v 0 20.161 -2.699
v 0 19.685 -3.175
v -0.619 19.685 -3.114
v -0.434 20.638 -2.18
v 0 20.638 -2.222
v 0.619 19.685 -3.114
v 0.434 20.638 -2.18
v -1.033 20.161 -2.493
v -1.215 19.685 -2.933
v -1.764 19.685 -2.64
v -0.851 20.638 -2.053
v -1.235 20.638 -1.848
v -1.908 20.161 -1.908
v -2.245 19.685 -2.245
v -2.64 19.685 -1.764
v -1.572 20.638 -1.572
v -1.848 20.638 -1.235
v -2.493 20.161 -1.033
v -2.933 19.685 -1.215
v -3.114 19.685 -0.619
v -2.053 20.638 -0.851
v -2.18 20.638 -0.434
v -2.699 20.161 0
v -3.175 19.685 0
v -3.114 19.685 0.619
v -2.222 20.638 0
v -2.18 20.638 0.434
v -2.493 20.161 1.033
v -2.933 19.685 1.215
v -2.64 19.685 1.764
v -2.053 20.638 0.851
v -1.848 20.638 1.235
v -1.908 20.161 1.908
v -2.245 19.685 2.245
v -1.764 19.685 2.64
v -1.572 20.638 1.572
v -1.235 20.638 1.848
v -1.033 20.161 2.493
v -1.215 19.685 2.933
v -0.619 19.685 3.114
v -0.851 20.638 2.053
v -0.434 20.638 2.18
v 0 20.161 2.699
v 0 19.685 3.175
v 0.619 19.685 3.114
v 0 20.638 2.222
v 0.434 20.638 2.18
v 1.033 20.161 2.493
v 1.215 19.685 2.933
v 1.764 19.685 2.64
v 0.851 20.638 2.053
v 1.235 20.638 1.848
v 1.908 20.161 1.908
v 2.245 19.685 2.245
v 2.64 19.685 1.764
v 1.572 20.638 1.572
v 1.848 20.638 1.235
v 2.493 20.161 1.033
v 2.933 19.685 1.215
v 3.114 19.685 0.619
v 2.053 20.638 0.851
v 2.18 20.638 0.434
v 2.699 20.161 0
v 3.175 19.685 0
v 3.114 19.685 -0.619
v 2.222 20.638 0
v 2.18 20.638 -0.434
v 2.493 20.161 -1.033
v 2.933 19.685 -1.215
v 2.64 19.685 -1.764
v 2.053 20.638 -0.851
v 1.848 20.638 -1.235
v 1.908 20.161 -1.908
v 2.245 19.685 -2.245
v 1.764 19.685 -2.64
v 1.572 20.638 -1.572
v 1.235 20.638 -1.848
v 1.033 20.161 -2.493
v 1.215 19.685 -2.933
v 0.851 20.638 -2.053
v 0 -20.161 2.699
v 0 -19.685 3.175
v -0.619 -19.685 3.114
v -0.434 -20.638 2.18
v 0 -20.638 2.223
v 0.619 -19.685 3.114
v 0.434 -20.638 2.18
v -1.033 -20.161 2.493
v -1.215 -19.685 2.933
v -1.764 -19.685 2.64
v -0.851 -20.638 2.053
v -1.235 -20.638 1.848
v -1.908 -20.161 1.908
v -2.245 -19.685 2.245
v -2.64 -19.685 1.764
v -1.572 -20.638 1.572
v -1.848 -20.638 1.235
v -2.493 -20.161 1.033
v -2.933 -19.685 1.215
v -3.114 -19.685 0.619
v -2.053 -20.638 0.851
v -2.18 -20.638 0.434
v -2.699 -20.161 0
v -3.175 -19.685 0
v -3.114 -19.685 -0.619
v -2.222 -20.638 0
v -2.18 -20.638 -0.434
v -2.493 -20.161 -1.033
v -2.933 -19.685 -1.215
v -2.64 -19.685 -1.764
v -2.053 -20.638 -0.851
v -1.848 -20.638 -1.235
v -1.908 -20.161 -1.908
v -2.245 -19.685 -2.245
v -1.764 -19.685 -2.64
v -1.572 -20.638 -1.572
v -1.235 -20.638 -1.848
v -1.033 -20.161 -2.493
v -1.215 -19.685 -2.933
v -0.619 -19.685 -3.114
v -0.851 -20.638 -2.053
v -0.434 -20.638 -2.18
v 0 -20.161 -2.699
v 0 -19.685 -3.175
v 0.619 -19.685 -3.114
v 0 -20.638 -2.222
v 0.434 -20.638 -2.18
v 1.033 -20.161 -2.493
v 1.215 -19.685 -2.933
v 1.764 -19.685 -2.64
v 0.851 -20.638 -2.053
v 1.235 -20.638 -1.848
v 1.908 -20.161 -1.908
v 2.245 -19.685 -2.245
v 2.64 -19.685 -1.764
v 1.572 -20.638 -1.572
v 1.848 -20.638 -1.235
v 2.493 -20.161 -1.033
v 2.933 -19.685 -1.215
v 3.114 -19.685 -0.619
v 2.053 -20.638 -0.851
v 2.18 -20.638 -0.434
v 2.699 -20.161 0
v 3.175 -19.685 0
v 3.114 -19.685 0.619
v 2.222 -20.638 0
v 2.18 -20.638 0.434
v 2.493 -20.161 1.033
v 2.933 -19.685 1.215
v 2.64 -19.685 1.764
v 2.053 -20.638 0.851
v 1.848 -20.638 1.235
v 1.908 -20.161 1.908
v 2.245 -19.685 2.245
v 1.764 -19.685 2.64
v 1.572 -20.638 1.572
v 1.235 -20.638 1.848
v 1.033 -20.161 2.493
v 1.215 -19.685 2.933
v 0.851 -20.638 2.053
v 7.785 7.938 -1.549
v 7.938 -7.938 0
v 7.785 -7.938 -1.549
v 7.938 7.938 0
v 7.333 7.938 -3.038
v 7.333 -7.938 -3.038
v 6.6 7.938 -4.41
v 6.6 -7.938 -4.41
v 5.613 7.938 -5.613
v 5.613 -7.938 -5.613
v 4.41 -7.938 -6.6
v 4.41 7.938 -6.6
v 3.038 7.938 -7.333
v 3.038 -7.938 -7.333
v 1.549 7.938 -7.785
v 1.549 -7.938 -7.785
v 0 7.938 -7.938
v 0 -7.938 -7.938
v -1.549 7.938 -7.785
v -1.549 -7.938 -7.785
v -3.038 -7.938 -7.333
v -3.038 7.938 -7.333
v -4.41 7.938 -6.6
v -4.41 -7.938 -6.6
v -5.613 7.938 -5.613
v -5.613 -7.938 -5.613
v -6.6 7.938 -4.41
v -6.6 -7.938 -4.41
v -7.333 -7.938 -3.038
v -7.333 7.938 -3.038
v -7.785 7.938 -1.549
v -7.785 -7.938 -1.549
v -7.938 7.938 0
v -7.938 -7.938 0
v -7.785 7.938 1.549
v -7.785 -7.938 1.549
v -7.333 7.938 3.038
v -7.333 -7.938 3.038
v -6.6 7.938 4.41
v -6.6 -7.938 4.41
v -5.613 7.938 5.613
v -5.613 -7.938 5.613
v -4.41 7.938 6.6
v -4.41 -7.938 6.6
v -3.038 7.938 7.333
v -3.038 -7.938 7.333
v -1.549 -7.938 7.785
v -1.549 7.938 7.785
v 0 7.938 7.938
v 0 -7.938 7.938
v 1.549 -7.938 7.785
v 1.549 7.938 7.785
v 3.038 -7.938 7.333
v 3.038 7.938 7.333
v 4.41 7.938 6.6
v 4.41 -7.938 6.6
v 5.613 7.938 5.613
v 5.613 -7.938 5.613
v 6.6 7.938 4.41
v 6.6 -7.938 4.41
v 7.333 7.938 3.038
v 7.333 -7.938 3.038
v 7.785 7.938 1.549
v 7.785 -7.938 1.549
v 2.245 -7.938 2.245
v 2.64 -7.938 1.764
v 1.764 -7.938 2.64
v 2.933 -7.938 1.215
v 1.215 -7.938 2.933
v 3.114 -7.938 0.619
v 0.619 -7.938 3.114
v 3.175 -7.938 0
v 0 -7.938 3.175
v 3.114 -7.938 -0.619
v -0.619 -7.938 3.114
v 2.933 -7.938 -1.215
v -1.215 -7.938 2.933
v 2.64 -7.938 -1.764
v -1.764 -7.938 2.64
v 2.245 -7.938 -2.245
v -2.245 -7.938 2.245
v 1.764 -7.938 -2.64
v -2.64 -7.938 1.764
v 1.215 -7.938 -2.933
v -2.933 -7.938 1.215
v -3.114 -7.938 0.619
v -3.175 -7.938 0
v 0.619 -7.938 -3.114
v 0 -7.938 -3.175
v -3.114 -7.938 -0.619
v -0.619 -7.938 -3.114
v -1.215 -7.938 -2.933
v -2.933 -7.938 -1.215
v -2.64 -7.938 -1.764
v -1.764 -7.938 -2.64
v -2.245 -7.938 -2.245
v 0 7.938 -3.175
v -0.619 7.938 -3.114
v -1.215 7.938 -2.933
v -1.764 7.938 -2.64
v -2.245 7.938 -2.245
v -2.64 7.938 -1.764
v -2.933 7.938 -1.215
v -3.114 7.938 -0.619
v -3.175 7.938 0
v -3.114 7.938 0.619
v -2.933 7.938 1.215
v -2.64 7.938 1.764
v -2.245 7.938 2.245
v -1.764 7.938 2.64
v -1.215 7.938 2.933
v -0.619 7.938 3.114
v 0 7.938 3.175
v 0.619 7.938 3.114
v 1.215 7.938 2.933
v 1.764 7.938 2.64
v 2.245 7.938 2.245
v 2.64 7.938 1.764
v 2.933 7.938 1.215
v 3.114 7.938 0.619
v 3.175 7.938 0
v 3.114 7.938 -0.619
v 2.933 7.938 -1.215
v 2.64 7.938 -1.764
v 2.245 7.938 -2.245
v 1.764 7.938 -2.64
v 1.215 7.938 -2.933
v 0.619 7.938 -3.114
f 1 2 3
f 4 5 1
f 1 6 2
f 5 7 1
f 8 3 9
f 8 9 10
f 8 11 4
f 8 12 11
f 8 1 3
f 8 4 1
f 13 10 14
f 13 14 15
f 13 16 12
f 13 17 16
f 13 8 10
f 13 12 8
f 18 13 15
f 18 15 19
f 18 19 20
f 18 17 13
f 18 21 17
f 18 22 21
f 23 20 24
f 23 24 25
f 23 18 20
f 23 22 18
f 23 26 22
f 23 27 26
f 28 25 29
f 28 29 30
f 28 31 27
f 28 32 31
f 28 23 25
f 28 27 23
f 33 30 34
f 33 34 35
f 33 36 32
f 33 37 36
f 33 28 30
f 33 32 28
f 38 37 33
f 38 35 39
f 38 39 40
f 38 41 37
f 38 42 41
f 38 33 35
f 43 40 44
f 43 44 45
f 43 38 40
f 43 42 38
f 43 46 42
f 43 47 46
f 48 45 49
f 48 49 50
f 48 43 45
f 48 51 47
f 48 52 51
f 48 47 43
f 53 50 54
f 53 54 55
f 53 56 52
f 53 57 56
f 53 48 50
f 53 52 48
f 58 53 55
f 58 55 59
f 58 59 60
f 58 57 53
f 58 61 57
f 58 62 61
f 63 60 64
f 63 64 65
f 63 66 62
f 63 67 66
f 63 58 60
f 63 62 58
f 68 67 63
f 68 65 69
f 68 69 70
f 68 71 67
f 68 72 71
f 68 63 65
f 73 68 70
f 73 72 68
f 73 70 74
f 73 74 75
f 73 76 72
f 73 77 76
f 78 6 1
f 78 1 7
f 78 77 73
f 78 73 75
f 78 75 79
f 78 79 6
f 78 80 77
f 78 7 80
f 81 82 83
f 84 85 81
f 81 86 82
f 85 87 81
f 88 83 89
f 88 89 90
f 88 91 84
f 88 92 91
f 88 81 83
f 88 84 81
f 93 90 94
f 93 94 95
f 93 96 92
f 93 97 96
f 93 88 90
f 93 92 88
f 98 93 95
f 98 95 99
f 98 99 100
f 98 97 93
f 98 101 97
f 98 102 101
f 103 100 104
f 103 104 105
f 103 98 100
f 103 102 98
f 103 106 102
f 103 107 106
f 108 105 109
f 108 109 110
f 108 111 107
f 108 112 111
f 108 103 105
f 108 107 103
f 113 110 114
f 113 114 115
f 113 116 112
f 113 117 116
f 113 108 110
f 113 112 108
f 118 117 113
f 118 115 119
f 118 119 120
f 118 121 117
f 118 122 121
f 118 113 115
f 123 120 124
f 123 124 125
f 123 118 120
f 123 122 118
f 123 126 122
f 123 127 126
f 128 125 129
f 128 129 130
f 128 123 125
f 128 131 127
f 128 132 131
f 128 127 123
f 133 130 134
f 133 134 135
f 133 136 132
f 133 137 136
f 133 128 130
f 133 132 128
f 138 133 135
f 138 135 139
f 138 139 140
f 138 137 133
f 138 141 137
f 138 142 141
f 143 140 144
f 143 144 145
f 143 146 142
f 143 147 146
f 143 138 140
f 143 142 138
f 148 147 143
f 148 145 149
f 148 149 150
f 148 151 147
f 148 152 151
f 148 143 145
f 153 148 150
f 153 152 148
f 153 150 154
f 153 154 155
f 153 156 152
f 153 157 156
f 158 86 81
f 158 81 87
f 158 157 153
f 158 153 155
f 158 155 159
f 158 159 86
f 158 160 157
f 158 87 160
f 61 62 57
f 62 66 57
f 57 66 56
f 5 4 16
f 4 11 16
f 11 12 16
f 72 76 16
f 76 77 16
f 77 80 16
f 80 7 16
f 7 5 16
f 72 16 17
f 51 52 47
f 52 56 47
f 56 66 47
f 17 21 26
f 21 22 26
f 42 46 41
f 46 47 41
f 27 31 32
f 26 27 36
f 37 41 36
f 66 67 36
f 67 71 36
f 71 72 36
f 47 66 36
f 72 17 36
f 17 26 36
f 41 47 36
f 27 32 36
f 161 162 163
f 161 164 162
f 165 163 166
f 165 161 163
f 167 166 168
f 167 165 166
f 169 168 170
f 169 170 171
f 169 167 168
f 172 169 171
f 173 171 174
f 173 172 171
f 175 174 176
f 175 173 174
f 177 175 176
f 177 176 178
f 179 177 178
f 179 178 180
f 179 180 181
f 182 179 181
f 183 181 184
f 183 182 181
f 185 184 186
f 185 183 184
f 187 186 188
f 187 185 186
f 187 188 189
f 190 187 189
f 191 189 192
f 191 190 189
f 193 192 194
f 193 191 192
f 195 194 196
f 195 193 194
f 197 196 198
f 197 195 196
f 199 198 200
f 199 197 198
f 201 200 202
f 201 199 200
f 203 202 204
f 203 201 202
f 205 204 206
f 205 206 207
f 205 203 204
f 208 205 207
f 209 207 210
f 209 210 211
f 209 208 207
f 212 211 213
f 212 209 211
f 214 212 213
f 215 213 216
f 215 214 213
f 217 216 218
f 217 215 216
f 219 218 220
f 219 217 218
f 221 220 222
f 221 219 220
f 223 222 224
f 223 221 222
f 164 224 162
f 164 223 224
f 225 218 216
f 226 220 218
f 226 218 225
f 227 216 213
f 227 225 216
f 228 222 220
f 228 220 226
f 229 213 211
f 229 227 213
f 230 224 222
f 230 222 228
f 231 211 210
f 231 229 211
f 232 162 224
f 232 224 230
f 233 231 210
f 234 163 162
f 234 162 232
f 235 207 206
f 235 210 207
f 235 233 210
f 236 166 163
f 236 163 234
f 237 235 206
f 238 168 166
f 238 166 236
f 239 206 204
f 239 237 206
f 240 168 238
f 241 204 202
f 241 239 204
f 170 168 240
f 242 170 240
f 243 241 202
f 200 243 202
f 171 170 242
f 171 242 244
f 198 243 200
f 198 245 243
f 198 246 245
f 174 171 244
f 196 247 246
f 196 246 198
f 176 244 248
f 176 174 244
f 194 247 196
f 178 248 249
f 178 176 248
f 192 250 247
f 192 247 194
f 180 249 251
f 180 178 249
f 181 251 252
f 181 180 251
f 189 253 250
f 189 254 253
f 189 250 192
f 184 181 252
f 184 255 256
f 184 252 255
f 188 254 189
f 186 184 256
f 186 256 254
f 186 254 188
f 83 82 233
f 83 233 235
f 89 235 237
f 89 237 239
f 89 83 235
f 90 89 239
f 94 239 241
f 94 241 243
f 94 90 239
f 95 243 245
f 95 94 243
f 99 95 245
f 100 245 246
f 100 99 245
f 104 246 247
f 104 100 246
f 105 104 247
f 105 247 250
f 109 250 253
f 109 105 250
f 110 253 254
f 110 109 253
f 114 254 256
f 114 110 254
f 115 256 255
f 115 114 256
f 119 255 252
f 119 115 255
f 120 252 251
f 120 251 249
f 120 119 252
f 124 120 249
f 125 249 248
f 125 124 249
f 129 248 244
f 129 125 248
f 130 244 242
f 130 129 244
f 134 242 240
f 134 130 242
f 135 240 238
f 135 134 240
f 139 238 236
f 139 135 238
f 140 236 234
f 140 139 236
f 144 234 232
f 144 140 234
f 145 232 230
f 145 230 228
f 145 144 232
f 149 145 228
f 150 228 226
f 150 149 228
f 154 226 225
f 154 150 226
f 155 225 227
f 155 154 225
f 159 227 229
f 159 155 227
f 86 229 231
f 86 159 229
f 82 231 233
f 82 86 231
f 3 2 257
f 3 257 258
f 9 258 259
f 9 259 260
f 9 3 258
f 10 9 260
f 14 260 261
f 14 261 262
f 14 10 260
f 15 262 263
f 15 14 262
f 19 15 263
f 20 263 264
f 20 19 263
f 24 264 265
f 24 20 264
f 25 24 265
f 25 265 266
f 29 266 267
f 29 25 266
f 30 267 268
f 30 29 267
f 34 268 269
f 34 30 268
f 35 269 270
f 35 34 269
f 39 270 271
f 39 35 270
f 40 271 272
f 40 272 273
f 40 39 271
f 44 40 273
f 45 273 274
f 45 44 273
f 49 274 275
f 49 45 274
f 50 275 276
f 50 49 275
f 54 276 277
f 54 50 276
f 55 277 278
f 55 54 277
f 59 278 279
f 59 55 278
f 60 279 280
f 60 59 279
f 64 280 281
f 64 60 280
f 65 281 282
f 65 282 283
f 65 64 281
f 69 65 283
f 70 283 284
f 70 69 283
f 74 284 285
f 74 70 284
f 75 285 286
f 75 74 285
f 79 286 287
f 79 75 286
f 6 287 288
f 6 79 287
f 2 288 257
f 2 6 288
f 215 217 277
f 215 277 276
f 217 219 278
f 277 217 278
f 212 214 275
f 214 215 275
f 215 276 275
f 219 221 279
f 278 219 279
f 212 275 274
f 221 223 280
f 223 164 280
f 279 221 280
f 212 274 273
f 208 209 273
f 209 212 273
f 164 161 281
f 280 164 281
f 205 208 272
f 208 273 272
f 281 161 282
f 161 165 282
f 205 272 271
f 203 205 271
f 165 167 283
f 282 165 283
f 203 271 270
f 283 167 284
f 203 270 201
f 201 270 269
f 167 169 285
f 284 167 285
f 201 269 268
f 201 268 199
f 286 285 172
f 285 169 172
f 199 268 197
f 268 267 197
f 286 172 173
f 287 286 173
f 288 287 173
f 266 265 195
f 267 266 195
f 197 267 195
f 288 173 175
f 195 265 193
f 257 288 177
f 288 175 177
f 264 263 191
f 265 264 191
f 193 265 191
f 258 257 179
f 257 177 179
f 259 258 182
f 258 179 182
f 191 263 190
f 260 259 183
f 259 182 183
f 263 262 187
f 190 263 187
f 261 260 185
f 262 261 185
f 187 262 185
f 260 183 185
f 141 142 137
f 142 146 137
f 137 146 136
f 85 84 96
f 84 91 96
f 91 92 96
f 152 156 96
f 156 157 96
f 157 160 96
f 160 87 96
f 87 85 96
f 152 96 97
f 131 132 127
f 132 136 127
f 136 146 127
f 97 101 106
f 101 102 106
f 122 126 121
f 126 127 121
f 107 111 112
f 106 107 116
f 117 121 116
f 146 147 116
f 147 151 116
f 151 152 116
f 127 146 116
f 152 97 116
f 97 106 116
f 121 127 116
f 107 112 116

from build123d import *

# Parameters (mm, degrees)
SKETCH1_W             = 3.175
SKETCH1_H             = 12.7
CHAMFER1_SIZE         = 0.9525
BODY_MOVE_COPY1_ANGLE = 180
SKETCH4_W             = 7.9375
SKETCH4_H             = 15.875


with BuildPart() as part:
    # Sketch1 → Revolve1 (revolve)
    with BuildSketch(Plane.XY):
        with Locations((1.5875, 14.2875)):
            Rectangle(SKETCH1_W, SKETCH1_H)
    revolve(axis=Axis((0, 7.9375, 0), (0, 1, 0)))

    # Chamfer1
    chamfer1_edges = [part.edges().sort_by_distance(p)[0] for p in [
        (-3.175, 20.6375, 0),
    ]]
    chamfer(chamfer1_edges, length=CHAMFER1_SIZE)


with BuildPart() as body_2:
    # Body-Move/Copy1: copy of part
    add(part.part.rotate(Axis((0, 0, 0), (1, 0, 0)), BODY_MOVE_COPY1_ANGLE))


with BuildPart() as part_1:
    add(part.part)

    add(body_2.part)  # Revolve2 merges body 2
    # Sketch4 → Revolve2 (revolve)
    with BuildSketch(Plane.XY):
        with Locations((3.96875, 0)):
            Rectangle(SKETCH4_W, SKETCH4_H)
    revolve(axis=Axis((0, -7.9375, 0), (0, 1, 0)))


solid = part_1.part
